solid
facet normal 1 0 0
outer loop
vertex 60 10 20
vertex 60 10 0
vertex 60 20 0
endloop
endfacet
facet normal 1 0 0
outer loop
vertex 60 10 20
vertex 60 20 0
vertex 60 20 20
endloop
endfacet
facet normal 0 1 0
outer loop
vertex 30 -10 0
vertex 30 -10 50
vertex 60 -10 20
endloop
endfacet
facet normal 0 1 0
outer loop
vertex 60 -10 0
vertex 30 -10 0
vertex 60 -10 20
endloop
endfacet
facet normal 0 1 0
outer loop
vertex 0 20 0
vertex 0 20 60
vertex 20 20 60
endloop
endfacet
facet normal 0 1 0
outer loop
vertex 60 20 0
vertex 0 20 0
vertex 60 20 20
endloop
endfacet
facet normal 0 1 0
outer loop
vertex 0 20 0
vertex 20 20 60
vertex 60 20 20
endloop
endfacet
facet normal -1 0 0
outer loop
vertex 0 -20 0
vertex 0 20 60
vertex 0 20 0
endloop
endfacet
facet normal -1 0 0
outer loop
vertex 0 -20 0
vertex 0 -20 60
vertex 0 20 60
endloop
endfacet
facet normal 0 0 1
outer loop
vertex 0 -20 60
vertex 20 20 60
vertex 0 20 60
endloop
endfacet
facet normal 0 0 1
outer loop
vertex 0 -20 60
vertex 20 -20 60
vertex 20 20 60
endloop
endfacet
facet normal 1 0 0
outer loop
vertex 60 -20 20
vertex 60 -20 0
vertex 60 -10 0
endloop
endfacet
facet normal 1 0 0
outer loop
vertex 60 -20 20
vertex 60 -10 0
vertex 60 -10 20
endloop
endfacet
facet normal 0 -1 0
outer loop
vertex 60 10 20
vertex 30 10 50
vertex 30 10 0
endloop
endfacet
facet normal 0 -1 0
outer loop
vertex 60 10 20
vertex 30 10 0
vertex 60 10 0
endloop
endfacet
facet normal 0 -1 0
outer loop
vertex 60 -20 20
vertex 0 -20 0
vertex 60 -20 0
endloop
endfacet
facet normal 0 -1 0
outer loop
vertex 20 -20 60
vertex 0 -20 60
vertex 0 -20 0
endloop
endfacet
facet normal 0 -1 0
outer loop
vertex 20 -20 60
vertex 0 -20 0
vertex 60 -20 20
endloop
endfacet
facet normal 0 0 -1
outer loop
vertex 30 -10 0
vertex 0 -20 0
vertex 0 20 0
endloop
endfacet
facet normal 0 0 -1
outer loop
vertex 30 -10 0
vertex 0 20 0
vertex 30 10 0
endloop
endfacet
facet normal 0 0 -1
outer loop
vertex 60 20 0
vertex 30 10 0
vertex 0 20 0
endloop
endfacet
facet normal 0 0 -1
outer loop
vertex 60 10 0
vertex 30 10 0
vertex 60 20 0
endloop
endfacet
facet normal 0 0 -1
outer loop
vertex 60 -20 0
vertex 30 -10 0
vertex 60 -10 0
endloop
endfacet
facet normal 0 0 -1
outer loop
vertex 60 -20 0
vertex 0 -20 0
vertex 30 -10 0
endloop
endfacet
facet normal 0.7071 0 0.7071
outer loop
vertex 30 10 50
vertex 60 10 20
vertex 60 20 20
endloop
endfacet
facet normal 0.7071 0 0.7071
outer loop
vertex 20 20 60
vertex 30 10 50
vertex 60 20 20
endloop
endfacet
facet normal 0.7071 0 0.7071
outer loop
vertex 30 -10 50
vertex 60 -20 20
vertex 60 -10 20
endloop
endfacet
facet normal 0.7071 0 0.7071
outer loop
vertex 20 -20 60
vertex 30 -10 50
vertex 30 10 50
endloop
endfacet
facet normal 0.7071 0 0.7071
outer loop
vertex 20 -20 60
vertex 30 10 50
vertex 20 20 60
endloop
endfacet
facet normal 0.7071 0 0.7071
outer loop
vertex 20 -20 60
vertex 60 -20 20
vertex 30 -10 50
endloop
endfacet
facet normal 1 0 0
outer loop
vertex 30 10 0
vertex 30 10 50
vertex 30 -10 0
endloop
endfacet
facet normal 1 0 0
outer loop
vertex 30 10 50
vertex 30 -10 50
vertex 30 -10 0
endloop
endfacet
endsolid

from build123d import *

# Parameters (mm, degrees)
F1_DEPTH = 20
F2_DEPTH = 20
F3_DEPTH = 10


with BuildPart() as f1:
    # F0 (on Front) → F1 (new body, symmetric)
    with BuildSketch(Plane.XZ):
        Polygon((0, 60), (0, 0), (30, 0), (30, 50), (20, 60), align=None)
    extrude(amount=F1_DEPTH, both=True)

    # F0 (on Front) → F2 (join, symmetric)
    with BuildSketch(Plane.XZ):
        Polygon((30, 50), (30, 0), (60, 0), (60, 20), align=None)
    extrude(amount=F2_DEPTH, both=True)

    # F0 (on Front) → F3 (cut, symmetric)
    with BuildSketch(Plane.XZ):
        Polygon((30, 50), (30, 0), (60, 0), (60, 20), align=None)
    extrude(amount=F3_DEPTH, both=True, mode=Mode.SUBTRACT)


solid = f1.part
